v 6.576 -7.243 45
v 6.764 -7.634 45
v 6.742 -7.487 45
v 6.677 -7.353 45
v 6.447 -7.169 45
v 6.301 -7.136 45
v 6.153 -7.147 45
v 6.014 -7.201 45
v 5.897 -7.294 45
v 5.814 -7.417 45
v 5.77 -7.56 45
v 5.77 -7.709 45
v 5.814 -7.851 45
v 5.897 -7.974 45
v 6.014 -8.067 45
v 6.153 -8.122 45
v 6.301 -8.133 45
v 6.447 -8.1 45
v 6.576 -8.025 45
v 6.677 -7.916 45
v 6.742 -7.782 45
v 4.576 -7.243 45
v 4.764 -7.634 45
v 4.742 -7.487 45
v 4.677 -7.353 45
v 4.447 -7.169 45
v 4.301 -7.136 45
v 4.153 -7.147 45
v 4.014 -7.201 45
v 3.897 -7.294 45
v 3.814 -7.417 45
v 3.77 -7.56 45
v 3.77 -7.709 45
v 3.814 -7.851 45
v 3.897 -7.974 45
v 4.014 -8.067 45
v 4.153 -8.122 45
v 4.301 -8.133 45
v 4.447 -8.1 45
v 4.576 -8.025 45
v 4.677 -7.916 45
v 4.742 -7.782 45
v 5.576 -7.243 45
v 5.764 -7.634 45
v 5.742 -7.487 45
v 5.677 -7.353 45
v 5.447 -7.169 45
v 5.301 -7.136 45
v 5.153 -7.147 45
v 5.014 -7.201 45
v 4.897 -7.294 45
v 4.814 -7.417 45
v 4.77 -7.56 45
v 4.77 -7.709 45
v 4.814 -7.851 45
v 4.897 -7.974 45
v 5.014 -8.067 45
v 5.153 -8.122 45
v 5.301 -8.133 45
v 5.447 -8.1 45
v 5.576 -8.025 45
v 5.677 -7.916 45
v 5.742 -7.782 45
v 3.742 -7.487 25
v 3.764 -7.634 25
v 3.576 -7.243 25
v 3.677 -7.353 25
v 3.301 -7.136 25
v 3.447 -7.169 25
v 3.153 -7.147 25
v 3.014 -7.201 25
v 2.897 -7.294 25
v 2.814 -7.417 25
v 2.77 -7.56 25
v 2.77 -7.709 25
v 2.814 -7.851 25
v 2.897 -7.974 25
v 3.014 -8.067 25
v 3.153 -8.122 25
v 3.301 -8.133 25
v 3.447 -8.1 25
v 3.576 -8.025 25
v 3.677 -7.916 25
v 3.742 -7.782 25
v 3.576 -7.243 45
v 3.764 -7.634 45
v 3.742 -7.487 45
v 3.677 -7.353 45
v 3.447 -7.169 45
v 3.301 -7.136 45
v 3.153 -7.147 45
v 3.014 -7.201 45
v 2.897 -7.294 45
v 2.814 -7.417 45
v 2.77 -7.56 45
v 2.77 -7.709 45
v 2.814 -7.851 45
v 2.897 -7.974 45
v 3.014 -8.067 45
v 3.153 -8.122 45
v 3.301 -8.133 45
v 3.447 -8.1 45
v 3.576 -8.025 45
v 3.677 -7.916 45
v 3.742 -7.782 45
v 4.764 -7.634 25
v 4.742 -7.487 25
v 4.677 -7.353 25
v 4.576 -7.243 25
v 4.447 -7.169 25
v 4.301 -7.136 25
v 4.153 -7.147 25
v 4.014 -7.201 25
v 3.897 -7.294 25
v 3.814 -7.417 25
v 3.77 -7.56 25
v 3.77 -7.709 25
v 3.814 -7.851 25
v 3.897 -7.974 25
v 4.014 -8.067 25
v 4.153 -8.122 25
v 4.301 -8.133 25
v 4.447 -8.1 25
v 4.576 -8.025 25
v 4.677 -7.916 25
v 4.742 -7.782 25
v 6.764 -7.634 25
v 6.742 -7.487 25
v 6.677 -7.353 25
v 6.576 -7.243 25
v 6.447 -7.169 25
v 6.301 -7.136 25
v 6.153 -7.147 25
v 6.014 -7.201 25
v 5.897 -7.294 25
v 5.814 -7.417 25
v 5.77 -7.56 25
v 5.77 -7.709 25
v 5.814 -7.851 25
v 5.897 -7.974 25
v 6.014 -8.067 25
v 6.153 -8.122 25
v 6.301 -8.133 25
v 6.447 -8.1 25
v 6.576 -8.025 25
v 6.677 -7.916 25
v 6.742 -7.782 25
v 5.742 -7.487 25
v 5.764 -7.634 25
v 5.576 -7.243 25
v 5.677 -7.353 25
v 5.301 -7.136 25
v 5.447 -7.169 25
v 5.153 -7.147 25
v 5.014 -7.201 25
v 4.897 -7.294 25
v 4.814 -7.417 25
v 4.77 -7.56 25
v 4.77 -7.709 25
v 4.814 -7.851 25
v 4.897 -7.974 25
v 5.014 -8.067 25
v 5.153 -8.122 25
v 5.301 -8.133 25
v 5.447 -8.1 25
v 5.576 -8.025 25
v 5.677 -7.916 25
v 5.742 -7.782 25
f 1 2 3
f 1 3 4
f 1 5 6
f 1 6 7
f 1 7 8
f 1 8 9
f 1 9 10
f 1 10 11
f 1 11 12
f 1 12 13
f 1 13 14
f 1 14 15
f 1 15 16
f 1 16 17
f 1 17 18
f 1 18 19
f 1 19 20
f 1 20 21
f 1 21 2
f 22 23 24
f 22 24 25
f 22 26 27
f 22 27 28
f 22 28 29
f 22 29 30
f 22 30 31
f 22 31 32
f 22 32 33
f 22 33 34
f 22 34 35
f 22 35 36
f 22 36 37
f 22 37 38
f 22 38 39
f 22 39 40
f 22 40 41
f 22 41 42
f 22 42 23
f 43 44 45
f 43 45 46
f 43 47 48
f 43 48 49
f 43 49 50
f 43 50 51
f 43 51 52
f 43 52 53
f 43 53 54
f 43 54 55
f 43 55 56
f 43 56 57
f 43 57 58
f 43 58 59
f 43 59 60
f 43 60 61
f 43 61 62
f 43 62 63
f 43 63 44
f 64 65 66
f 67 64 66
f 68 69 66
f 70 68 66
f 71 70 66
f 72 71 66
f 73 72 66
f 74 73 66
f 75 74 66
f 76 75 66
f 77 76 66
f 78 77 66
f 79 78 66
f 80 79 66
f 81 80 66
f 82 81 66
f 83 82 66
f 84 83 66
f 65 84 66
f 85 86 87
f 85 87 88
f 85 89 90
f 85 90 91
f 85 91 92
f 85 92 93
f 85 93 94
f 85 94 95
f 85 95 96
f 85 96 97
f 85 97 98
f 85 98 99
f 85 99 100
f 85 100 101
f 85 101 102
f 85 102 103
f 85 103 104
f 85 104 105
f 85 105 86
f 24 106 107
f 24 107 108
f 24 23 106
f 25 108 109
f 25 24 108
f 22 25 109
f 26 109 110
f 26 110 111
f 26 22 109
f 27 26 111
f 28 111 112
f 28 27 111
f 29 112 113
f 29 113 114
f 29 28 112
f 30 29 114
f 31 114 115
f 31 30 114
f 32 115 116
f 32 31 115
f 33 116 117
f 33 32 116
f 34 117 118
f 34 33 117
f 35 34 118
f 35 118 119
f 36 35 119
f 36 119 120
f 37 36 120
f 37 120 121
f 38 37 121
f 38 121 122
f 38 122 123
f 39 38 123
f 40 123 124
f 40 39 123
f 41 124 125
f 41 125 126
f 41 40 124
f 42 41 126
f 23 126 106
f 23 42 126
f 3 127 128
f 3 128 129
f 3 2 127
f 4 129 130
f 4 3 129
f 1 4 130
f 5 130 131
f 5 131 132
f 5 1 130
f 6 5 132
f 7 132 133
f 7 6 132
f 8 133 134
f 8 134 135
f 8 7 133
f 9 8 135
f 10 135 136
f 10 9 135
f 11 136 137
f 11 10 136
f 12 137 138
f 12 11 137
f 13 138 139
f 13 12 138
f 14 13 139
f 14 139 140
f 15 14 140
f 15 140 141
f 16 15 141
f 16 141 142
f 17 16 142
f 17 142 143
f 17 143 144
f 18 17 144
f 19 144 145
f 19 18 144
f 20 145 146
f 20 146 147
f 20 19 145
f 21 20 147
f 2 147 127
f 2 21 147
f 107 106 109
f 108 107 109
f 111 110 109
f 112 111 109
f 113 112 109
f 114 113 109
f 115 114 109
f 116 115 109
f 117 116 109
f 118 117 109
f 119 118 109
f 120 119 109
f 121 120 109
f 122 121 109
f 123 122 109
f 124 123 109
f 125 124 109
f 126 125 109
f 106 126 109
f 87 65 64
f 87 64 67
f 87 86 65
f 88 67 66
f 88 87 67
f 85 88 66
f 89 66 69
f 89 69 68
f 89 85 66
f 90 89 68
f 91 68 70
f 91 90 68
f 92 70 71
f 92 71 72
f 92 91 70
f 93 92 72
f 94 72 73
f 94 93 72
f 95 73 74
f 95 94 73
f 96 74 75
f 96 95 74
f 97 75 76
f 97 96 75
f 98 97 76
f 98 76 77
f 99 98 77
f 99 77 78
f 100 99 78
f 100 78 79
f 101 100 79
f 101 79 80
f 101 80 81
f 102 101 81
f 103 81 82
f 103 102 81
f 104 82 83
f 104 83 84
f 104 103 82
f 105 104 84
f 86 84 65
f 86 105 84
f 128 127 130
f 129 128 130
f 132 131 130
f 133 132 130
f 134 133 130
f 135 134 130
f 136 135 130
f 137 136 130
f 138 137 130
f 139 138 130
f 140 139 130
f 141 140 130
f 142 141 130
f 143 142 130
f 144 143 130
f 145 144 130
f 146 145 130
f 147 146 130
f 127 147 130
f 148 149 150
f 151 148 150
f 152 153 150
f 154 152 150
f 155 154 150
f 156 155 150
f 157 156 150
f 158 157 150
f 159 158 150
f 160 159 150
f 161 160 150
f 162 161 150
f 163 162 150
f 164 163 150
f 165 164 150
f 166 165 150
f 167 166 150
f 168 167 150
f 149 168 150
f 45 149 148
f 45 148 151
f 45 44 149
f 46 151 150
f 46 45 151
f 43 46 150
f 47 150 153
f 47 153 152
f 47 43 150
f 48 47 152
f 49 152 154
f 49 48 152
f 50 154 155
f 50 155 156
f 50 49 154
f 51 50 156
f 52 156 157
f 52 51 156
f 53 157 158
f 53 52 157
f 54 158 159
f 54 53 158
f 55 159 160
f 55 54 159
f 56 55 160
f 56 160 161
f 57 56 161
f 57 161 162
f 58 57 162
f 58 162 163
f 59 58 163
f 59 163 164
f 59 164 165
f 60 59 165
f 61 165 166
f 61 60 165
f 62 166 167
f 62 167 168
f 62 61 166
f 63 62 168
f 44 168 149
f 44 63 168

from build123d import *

# Parameters (mm, degrees)
ESQUISSE1_R                  = 0.5
BOSS_EXTRU_1_DEPTH           = 10
R_P_TITION_LIN_AIRE1_COUNT   = 3
R_P_TITION_LIN_AIRE1_PITCH   = 1
R_P_TITION_LIN_AIRE1_2_COUNT = 2
R_P_TITION_LIN_AIRE1_2_PITCH = 1


with BuildPart() as part:
    # Esquisse1 → Boss.-Extru.1 (new, symmetric)
    with BuildSketch(Plane.XY.offset(35)):
        with Locations((4.263994142, -7.634270778)):
            Circle(ESQUISSE1_R)
    extrude(amount=BOSS_EXTRU_1_DEPTH, both=True)


with BuildPart() as r_p_tition_lin_aire1_1:
    # Répétition linéaire1: pattern copy
    add(part.part.moved(Location(Vector(1, 0, 0) * (1 * R_P_TITION_LIN_AIRE1_PITCH))))


with BuildPart() as r_p_tition_lin_aire1_2:
    # Répétition linéaire1: pattern copy
    add(part.part.moved(Location(Vector(1, 0, 0) * (2 * R_P_TITION_LIN_AIRE1_PITCH))))


with BuildPart() as r_p_tition_lin_aire1_2_1:
    # R_p_tition lin_aire1 2: pattern copy
    add(part.part.moved(Location(Vector(-1, 0, 0) * (1 * R_P_TITION_LIN_AIRE1_2_PITCH))))


solid = Compound([part.part, r_p_tition_lin_aire1_1.part, r_p_tition_lin_aire1_2.part, r_p_tition_lin_aire1_2_1.part])
